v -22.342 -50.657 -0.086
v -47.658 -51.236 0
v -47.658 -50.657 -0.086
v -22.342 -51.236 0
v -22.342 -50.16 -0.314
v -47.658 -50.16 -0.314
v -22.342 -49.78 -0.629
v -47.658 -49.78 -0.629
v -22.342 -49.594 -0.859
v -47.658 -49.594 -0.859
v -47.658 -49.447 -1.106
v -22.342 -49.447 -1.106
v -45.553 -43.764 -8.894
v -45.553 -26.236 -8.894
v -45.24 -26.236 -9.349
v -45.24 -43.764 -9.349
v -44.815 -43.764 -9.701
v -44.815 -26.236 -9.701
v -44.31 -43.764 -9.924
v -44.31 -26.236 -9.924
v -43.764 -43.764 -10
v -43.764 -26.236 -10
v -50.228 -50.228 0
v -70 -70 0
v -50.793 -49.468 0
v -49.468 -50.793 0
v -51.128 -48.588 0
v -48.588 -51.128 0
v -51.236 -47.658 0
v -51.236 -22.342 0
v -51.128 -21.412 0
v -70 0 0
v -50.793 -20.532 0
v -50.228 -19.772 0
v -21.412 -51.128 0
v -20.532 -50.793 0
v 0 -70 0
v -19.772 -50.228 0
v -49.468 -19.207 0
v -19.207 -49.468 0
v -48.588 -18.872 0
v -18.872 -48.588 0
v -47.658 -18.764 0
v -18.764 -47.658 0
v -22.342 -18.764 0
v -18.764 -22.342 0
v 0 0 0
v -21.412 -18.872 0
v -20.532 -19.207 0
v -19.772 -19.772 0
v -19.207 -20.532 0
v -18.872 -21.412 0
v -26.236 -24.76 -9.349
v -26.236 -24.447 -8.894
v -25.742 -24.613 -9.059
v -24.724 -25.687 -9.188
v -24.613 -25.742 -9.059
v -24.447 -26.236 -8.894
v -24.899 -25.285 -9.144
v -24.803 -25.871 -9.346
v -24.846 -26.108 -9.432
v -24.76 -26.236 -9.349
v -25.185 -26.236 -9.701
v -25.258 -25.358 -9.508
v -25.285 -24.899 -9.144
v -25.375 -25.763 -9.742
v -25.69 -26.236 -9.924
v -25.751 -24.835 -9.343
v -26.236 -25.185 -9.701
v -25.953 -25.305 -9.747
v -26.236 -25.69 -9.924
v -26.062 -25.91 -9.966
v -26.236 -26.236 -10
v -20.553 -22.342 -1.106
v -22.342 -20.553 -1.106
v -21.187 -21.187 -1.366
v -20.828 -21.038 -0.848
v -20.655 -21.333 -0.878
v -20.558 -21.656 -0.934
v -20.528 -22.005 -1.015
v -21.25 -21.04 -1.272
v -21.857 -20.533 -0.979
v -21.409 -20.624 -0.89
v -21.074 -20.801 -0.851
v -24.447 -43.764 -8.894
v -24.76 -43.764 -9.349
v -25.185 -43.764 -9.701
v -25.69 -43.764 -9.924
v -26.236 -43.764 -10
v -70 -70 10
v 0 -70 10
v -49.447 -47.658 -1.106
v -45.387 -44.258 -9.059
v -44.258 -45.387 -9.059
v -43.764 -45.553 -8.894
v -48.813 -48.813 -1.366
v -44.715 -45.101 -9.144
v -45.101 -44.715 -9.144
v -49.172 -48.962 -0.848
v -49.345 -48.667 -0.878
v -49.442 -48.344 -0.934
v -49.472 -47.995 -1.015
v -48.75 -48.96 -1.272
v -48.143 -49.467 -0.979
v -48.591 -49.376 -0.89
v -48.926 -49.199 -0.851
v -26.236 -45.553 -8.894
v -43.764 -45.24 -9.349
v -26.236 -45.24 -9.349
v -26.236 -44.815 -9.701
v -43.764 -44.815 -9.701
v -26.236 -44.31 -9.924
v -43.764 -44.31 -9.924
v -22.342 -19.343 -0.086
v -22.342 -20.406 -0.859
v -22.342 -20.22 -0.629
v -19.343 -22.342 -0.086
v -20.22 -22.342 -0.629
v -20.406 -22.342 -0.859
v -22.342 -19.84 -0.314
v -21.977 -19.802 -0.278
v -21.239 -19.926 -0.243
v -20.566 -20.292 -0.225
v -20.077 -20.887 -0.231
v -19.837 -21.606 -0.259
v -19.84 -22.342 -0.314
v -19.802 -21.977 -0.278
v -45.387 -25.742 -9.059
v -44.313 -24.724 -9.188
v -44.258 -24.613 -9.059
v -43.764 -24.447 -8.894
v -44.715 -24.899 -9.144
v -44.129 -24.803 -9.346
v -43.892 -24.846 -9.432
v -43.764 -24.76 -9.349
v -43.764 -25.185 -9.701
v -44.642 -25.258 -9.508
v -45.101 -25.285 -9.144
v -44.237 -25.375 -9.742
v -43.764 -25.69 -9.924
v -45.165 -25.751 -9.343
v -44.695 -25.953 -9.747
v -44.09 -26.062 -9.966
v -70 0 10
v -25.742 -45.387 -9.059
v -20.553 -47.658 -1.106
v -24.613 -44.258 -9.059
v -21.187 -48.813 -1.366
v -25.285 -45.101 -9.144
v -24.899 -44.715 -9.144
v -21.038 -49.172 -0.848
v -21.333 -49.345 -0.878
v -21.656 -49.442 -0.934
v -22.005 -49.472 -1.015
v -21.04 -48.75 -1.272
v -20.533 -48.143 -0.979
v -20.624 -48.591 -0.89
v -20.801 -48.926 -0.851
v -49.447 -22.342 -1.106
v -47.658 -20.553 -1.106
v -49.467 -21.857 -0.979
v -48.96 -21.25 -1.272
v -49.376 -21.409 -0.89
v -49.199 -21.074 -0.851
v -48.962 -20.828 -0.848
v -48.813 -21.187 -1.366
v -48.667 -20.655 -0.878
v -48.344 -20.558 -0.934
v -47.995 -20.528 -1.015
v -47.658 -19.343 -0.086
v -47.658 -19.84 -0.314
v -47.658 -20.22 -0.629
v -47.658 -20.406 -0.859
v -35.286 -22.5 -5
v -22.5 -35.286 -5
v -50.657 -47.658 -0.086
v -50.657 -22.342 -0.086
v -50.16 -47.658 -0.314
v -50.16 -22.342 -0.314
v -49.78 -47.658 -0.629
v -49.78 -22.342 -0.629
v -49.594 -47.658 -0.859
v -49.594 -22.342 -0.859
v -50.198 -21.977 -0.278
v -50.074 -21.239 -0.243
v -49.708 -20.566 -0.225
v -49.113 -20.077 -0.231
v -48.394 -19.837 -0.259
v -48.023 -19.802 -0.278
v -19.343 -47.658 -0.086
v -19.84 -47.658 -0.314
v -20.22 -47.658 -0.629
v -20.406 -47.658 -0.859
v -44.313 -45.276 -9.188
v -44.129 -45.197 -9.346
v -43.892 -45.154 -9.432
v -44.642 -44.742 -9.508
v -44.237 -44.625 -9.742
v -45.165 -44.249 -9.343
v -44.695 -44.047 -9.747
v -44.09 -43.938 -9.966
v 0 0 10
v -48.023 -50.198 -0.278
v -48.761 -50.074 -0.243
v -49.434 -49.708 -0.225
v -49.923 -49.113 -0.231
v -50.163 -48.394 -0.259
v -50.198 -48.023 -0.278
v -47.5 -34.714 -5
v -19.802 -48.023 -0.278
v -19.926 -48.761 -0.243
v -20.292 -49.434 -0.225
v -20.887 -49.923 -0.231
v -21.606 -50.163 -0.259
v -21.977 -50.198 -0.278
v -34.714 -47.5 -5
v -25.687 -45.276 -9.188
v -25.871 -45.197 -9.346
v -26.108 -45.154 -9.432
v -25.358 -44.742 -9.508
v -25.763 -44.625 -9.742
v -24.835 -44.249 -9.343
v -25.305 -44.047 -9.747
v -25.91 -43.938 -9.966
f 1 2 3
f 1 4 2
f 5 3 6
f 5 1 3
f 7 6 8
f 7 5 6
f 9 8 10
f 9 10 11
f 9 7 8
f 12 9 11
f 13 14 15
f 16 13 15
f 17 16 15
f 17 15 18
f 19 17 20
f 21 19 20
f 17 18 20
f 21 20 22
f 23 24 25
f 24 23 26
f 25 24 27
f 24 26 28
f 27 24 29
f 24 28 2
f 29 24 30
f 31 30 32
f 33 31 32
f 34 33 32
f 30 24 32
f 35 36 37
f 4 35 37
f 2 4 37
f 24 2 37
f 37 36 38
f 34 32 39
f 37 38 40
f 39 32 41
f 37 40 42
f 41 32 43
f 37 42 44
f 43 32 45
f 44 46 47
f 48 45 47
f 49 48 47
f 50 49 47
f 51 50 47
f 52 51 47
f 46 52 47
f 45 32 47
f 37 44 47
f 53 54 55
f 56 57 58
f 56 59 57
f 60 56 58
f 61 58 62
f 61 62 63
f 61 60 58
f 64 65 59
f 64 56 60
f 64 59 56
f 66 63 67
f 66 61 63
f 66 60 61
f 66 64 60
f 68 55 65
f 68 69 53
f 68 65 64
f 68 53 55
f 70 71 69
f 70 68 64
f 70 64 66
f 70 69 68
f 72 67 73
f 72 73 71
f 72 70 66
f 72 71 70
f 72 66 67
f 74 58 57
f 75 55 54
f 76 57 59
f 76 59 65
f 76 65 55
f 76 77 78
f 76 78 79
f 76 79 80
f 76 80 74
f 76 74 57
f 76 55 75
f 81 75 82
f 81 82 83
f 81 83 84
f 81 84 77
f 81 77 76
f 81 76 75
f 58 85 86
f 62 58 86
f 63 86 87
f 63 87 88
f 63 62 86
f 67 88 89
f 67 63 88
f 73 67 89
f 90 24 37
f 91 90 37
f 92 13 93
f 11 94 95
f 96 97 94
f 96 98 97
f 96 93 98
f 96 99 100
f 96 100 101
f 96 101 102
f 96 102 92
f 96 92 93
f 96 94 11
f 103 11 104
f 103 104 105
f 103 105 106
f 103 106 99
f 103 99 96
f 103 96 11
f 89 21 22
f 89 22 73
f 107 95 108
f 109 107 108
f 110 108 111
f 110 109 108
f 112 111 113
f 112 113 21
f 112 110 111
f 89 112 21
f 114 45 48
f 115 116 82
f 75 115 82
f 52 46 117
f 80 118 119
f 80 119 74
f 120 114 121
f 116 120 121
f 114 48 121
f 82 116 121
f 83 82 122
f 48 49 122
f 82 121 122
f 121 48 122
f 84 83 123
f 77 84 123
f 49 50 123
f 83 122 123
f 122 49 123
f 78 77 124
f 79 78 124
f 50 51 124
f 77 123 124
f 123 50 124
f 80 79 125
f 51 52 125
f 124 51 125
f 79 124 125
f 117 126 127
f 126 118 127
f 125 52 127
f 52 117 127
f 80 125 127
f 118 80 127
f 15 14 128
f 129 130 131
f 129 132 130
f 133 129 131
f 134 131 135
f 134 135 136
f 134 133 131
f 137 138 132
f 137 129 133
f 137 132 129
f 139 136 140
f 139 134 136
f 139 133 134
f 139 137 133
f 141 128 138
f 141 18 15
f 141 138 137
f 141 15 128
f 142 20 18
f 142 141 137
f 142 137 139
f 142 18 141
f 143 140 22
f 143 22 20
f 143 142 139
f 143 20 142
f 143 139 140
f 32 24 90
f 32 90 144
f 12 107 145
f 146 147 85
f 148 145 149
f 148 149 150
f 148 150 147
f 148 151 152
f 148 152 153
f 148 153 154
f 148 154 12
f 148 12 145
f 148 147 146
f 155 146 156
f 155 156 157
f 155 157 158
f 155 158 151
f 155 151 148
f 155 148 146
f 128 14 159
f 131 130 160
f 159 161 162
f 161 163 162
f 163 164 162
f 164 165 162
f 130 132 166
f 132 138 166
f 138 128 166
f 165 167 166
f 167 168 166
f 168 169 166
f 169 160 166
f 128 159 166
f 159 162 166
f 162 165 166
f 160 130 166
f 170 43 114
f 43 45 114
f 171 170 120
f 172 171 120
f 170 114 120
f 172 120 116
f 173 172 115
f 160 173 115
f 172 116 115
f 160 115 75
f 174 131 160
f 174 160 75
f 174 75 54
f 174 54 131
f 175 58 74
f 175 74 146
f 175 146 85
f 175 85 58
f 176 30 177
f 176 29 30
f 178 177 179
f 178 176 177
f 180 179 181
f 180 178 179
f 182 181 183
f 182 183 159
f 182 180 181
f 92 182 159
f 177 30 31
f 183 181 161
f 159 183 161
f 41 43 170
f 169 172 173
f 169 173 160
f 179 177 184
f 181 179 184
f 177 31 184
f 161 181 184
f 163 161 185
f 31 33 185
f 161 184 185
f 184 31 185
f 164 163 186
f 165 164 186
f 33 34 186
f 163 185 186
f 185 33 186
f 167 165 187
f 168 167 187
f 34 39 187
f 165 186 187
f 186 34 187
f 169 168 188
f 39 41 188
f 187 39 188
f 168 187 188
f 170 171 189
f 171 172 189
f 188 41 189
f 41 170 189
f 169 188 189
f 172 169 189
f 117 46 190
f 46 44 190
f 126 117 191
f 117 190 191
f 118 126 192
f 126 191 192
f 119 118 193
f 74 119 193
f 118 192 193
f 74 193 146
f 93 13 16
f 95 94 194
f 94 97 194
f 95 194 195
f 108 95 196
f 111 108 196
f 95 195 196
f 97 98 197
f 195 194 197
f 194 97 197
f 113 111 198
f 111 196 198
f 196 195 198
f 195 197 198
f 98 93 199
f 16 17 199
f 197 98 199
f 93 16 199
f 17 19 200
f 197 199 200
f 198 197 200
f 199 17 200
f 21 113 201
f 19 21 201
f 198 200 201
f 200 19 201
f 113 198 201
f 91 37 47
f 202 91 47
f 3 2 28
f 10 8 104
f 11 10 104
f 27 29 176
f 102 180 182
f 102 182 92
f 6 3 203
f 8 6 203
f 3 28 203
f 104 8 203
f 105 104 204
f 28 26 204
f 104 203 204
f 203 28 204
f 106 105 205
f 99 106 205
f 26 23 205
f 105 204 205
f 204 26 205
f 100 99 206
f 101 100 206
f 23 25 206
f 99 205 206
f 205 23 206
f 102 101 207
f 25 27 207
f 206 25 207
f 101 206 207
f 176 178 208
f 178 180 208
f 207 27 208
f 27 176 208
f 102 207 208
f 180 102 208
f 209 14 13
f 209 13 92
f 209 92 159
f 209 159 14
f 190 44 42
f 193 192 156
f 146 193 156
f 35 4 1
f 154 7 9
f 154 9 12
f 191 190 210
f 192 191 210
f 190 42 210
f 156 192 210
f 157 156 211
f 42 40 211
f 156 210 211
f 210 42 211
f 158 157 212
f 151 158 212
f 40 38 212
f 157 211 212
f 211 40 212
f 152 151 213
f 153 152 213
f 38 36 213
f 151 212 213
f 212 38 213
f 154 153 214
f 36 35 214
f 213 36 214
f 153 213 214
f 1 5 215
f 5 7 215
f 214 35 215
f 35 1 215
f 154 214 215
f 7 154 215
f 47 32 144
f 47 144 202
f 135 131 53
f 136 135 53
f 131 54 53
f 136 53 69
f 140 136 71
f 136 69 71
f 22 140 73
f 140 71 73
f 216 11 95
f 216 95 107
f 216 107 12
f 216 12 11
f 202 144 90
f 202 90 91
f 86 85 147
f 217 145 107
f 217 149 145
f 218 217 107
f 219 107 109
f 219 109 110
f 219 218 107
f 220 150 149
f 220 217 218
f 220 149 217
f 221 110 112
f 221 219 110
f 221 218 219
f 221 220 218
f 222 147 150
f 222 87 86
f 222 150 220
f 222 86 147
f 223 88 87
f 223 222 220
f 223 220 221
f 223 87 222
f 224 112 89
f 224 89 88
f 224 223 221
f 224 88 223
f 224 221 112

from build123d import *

# Parameters (mm, degrees)
SKETCH_W    = 70
SKETCH_H    = 70
PAD_DEPTH   = 10
SKETCH004_W = 20
SKETCH004_H = 20
SKETCH003_W = 30
SKETCH003_H = 30
FILLET_R    = 2


with BuildPart() as part:
    # Sketch → Pad (new body)
    with BuildSketch(Plane.XY):
        with Locations((-35, -35)):
            Rectangle(SKETCH_W, SKETCH_H)
    extrude(amount=PAD_DEPTH)

    # Sketch004 (on DatumPlane) → AdditiveLoft section 0
    with BuildSketch(Plane.XY.offset(-10)):
        with Locations((-35, -35)):
            Rectangle(SKETCH004_W, SKETCH004_H)
    # Sketch003 (on Face5 of Pad) → AdditiveLoft section 1
    with BuildSketch(Plane(origin=(0, 0, 0), x_dir=(1, 0, 0), z_dir=(0, 0, -1))):
        with Locations((-35, 35)):
            Rectangle(SKETCH003_W, SKETCH003_H)
    loft()

    # Fillet
    fillet_edges = [part.edges().sort_by_distance(p)[0] for p in [
        (-45, -35, -10),
        (-47.5, -22.5, -5),
        (-50, -35, 0),
        (-47.5, -47.5, -5),
        (-35, -25, -10),
        (-22.5, -22.5, -5),
        (-35, -20, 0),
        (-25, -35, -10),
        (-22.5, -47.5, -5),
        (-20, -35, 0),
        (-35, -45, -10),
        (-35, -50, 0),
    ]]
    fillet(fillet_edges, radius=FILLET_R)


solid = part.part
